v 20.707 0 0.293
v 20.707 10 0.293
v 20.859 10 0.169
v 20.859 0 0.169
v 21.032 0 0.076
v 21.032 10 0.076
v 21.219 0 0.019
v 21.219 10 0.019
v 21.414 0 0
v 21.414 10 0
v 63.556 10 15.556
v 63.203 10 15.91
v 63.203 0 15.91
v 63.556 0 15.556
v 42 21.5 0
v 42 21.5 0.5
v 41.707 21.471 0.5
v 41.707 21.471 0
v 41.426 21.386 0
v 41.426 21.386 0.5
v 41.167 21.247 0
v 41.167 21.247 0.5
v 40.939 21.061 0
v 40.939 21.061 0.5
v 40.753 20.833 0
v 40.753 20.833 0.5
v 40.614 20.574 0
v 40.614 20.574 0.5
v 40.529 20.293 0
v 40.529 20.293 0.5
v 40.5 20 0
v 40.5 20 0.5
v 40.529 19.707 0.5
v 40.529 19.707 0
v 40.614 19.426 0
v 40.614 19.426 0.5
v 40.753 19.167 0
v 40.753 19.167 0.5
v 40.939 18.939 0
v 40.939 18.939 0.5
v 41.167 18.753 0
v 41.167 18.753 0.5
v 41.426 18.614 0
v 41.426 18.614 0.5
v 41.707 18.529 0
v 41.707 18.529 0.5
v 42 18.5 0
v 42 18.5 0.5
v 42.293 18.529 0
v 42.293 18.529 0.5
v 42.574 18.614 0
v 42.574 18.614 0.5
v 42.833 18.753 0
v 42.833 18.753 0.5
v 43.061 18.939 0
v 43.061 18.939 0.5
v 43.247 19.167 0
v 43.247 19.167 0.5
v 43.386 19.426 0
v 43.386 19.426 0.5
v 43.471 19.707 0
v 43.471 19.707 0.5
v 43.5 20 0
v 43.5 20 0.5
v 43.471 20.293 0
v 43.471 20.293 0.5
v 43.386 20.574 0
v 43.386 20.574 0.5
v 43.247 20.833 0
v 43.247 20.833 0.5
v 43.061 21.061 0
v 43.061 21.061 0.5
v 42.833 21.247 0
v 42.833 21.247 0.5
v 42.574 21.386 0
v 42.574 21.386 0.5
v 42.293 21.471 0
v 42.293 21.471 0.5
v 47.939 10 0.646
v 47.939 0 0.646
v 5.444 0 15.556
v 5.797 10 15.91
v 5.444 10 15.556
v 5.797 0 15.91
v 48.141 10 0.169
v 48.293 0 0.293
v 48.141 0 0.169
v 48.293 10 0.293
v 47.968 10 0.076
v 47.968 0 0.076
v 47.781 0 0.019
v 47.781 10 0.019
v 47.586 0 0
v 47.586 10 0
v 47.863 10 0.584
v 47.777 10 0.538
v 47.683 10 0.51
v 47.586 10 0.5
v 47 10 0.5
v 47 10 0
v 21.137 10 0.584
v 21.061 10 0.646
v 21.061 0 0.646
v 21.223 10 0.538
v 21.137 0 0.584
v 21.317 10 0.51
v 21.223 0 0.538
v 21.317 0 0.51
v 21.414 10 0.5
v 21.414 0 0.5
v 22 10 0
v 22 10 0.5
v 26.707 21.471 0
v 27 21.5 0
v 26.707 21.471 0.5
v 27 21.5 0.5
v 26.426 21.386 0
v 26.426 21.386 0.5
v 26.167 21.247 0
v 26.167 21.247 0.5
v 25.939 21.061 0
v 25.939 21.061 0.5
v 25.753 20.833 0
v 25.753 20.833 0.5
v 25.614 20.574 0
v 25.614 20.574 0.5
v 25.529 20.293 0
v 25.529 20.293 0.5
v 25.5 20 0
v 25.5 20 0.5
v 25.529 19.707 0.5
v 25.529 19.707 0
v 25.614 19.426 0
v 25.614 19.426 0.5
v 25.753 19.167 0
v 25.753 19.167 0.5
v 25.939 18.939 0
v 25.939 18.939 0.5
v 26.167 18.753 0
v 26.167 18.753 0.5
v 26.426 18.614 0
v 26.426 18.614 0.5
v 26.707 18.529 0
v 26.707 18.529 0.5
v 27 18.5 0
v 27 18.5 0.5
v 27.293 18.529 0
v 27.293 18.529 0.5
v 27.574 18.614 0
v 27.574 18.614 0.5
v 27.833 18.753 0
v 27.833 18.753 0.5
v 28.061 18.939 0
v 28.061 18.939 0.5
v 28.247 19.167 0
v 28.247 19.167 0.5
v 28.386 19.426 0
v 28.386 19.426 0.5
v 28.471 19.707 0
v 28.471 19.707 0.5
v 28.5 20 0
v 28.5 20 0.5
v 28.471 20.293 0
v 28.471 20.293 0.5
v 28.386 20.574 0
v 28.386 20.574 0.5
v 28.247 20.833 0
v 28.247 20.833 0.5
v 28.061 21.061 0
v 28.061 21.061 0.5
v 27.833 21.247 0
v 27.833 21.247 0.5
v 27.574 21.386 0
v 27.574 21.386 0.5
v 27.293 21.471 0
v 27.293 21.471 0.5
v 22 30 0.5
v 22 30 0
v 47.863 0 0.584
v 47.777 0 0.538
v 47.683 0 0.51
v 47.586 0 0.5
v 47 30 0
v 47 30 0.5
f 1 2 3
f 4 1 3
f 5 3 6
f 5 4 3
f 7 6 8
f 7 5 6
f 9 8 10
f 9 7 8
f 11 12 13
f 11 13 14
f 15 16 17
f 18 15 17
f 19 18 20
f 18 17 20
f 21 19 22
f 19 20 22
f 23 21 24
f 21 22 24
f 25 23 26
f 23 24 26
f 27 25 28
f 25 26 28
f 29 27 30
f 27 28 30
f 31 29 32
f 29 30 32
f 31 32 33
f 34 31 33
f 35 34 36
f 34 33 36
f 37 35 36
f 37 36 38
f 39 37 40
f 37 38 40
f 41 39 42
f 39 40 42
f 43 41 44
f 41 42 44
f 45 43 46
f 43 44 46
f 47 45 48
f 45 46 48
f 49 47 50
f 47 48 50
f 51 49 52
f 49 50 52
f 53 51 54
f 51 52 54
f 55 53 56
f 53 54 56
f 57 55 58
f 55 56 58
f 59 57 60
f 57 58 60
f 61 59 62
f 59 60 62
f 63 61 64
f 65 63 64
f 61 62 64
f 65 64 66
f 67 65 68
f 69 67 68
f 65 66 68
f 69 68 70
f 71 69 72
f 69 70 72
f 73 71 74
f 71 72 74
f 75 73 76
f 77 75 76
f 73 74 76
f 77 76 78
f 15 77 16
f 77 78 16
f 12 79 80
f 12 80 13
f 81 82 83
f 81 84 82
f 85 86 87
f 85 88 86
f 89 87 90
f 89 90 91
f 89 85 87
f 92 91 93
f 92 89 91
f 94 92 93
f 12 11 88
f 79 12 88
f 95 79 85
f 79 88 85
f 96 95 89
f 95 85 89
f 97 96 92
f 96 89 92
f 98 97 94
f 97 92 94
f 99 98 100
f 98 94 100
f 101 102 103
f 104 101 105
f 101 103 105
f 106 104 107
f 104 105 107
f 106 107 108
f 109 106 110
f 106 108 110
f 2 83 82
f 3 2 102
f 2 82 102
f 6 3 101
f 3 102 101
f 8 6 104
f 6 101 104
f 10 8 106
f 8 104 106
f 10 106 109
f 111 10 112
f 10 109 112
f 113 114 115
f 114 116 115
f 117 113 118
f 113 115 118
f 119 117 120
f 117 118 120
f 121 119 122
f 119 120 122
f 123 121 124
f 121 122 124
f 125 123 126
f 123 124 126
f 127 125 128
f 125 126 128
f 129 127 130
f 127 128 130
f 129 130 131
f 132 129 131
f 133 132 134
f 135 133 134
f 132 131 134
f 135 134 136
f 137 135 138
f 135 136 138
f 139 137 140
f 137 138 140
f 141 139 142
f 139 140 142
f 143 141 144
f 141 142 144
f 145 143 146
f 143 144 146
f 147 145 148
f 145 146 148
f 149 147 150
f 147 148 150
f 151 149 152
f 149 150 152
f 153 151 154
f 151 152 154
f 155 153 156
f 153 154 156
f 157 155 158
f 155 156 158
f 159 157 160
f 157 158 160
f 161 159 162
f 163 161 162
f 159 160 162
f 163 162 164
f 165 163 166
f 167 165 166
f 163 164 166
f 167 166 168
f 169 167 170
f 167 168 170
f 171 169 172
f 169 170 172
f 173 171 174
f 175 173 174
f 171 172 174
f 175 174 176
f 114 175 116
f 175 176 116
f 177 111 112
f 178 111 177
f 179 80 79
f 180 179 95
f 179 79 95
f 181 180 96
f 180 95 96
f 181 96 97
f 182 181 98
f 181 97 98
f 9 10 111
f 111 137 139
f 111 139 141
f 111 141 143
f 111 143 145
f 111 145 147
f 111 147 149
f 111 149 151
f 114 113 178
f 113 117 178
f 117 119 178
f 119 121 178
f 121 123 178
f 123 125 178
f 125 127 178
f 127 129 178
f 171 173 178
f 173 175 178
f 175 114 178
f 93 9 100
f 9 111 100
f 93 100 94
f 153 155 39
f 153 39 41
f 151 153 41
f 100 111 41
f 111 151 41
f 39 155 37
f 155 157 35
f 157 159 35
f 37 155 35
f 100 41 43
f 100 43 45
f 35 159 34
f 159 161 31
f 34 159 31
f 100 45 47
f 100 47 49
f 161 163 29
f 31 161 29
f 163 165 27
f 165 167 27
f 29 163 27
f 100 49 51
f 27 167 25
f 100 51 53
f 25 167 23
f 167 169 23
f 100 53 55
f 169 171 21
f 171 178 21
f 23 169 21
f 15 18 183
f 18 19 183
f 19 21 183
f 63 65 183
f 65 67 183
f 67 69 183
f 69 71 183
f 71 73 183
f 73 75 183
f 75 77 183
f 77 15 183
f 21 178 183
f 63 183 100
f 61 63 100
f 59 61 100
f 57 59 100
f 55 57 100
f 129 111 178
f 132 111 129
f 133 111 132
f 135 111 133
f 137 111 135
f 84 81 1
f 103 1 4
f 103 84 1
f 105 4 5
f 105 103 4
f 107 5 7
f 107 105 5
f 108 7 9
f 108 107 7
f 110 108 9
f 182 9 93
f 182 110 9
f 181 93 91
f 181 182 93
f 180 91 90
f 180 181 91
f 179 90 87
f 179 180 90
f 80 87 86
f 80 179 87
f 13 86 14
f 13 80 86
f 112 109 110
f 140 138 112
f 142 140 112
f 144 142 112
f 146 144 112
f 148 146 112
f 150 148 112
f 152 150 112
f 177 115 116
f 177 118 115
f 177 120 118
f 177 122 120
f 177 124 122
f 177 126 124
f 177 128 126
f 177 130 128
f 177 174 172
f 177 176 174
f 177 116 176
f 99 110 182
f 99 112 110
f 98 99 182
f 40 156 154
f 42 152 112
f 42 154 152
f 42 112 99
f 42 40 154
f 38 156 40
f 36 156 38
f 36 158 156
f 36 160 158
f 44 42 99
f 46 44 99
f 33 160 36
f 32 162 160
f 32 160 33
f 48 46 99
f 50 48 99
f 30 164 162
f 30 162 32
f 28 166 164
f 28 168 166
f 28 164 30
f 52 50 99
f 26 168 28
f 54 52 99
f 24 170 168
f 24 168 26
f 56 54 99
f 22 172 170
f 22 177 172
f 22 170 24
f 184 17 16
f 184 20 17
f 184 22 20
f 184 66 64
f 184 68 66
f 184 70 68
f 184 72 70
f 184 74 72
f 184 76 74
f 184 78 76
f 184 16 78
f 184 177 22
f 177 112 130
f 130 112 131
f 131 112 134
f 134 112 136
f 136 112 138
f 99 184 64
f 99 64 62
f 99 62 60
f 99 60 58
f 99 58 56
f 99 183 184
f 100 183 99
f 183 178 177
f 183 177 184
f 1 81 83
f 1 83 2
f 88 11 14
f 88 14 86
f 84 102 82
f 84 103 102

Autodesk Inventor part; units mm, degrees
ref_plane "YZ Plane" through (0, 0, 0) normal (1, 0, 0) x (0, 1, 0)
ref_plane "XZ Plane" through (0, 0, 0) normal (0, 1, 0) x (-1, 0, 0)
ref_plane "XY Plane" through (0, 0, 0) normal (0, 0, 1) x (1, 0, 0)
sketch "Sketch1" plane through (0, 0, 0) normal (0, 0, 1) x (1, 0, 0)
  line L0 (0, 0) -> (0, 10)
  line L1 (0, 10) -> (21, 10)
  line L2 (22, 10) -> (22, 30)
  line L3 (22, 30) -> (47, 30)
  line L4 (47, 30) -> (47, 10)
  line L5 (48, 10) -> (69, 10)
  line L6 (69, 10) -> (69, 0)
  line L7 (21, 10) -> (21, 0)
  line L8 (48, 10) -> (48, 0)
  line L9 (69, 0) -> (48, 0)
  line L10 (21, 0) -> (0, 0)
  line L11 (21, 0) -> (48, 0)
  line L12 (48, 10) -> (47, 10)
  line L13 (21, 10) -> (22, 10)
  dimension "d0" = 22
  dimension "d1" = 22
  dimension "d2" = 10
  dimension "d3" = 25
  dimension "d5" = 10
  dimension "d8" = 1
  dimension "d9" = 1
extrude "Plate1" add sketch "Sketch1" along normal blind 0.5 contours L7 L13 L2 L3 L4 L12 L8 L11
sketch "Sketch2" plane through (21.3536, 0, 0.3536) normal (-0.7071068, 0, -0.7071068) x (0, -1, 0)
  line L0 (-10, 0) -> (0, 0)
  line L1 (0, 0) -> (0, 22)
  line L2 (0, 22) -> (-10, 22)
  line L3 (-10, 22) -> (-10, 0)
edge flange "Flange1" height 22 angle 45 thickness 0.5 bend radius 0.5 thickness toward (-0.7071068, 0, -0.7071068) relief straight relief width 0.5 relief depth 0.25 corner gap 0.5 corner form 0 edges at (21, 5, 0.5) (48, 5, 0.5) wall of the first edge with corners at (21.3536, 10, 0.3536) (21.3536, 0, 0.3536) (5.7972, 0, 15.9099) (5.7972, 10, 15.9099)
bend "Bend1"
corner "Corner1"
sketch "Sketch3" plane through (0, 0, 0) normal (0, 0, -1) x (-1, 0, 0)
  line L0 (-21.4142, 0) -> (-47.5858, 0) projected
  line L1 (-47, 10) -> (-47, 30) projected
  circle A0 centre (-42, 20) radius 1.5
  circle A1 centre (-27, 20) radius 1.5
  point P0 (0, 0)
  dimension "d21" = 3
  dimension "d22" = 3
  dimension "d23" = 15
  dimension "d24" = 20
  dimension "d25" = 5
hole "Hole1" at (42, 20, 0) at (27, 20, 0) direction (0, 0, 1) diameter 3 depth 0.5 tip angle 118
equation "\"d31\" = Thickness"
equation "\"d11\" = BendReliefWidth"
equation "\"d12\" = BendReliefDepth"
equation "\"d13\" = MinimumRemnant"
equation "\"d14\" = BendRadius"
equation "\"d17\" = BendRadius"
equation "\"d18\" = CornerReliefSize"
equation "\"d19\" = GapSize"
equation "\"d20\" = JacobiRadiusSize"
equation "\"BendRadius\" = Thickness"
equation "\"BendReliefWidth\" = Thickness"
equation "\"BendReliefDepth\" = 0.5 * Thickness"
equation "\"CornerReliefSize\" = 4 * Thickness"
equation "\"MinimumRemnant\" = 2 * Thickness"
equation "\"TransitionRadius\" = BendRadius"
equation "\"JacobiRadiusSize\" = Thickness"
equation "\"GapSize\" = Thickness"
equation "\"d10\" = BendRadius"
equation "\"Thickness\" = 0.5"
properties part number "PÁRA LAMA TRASEIRO"
